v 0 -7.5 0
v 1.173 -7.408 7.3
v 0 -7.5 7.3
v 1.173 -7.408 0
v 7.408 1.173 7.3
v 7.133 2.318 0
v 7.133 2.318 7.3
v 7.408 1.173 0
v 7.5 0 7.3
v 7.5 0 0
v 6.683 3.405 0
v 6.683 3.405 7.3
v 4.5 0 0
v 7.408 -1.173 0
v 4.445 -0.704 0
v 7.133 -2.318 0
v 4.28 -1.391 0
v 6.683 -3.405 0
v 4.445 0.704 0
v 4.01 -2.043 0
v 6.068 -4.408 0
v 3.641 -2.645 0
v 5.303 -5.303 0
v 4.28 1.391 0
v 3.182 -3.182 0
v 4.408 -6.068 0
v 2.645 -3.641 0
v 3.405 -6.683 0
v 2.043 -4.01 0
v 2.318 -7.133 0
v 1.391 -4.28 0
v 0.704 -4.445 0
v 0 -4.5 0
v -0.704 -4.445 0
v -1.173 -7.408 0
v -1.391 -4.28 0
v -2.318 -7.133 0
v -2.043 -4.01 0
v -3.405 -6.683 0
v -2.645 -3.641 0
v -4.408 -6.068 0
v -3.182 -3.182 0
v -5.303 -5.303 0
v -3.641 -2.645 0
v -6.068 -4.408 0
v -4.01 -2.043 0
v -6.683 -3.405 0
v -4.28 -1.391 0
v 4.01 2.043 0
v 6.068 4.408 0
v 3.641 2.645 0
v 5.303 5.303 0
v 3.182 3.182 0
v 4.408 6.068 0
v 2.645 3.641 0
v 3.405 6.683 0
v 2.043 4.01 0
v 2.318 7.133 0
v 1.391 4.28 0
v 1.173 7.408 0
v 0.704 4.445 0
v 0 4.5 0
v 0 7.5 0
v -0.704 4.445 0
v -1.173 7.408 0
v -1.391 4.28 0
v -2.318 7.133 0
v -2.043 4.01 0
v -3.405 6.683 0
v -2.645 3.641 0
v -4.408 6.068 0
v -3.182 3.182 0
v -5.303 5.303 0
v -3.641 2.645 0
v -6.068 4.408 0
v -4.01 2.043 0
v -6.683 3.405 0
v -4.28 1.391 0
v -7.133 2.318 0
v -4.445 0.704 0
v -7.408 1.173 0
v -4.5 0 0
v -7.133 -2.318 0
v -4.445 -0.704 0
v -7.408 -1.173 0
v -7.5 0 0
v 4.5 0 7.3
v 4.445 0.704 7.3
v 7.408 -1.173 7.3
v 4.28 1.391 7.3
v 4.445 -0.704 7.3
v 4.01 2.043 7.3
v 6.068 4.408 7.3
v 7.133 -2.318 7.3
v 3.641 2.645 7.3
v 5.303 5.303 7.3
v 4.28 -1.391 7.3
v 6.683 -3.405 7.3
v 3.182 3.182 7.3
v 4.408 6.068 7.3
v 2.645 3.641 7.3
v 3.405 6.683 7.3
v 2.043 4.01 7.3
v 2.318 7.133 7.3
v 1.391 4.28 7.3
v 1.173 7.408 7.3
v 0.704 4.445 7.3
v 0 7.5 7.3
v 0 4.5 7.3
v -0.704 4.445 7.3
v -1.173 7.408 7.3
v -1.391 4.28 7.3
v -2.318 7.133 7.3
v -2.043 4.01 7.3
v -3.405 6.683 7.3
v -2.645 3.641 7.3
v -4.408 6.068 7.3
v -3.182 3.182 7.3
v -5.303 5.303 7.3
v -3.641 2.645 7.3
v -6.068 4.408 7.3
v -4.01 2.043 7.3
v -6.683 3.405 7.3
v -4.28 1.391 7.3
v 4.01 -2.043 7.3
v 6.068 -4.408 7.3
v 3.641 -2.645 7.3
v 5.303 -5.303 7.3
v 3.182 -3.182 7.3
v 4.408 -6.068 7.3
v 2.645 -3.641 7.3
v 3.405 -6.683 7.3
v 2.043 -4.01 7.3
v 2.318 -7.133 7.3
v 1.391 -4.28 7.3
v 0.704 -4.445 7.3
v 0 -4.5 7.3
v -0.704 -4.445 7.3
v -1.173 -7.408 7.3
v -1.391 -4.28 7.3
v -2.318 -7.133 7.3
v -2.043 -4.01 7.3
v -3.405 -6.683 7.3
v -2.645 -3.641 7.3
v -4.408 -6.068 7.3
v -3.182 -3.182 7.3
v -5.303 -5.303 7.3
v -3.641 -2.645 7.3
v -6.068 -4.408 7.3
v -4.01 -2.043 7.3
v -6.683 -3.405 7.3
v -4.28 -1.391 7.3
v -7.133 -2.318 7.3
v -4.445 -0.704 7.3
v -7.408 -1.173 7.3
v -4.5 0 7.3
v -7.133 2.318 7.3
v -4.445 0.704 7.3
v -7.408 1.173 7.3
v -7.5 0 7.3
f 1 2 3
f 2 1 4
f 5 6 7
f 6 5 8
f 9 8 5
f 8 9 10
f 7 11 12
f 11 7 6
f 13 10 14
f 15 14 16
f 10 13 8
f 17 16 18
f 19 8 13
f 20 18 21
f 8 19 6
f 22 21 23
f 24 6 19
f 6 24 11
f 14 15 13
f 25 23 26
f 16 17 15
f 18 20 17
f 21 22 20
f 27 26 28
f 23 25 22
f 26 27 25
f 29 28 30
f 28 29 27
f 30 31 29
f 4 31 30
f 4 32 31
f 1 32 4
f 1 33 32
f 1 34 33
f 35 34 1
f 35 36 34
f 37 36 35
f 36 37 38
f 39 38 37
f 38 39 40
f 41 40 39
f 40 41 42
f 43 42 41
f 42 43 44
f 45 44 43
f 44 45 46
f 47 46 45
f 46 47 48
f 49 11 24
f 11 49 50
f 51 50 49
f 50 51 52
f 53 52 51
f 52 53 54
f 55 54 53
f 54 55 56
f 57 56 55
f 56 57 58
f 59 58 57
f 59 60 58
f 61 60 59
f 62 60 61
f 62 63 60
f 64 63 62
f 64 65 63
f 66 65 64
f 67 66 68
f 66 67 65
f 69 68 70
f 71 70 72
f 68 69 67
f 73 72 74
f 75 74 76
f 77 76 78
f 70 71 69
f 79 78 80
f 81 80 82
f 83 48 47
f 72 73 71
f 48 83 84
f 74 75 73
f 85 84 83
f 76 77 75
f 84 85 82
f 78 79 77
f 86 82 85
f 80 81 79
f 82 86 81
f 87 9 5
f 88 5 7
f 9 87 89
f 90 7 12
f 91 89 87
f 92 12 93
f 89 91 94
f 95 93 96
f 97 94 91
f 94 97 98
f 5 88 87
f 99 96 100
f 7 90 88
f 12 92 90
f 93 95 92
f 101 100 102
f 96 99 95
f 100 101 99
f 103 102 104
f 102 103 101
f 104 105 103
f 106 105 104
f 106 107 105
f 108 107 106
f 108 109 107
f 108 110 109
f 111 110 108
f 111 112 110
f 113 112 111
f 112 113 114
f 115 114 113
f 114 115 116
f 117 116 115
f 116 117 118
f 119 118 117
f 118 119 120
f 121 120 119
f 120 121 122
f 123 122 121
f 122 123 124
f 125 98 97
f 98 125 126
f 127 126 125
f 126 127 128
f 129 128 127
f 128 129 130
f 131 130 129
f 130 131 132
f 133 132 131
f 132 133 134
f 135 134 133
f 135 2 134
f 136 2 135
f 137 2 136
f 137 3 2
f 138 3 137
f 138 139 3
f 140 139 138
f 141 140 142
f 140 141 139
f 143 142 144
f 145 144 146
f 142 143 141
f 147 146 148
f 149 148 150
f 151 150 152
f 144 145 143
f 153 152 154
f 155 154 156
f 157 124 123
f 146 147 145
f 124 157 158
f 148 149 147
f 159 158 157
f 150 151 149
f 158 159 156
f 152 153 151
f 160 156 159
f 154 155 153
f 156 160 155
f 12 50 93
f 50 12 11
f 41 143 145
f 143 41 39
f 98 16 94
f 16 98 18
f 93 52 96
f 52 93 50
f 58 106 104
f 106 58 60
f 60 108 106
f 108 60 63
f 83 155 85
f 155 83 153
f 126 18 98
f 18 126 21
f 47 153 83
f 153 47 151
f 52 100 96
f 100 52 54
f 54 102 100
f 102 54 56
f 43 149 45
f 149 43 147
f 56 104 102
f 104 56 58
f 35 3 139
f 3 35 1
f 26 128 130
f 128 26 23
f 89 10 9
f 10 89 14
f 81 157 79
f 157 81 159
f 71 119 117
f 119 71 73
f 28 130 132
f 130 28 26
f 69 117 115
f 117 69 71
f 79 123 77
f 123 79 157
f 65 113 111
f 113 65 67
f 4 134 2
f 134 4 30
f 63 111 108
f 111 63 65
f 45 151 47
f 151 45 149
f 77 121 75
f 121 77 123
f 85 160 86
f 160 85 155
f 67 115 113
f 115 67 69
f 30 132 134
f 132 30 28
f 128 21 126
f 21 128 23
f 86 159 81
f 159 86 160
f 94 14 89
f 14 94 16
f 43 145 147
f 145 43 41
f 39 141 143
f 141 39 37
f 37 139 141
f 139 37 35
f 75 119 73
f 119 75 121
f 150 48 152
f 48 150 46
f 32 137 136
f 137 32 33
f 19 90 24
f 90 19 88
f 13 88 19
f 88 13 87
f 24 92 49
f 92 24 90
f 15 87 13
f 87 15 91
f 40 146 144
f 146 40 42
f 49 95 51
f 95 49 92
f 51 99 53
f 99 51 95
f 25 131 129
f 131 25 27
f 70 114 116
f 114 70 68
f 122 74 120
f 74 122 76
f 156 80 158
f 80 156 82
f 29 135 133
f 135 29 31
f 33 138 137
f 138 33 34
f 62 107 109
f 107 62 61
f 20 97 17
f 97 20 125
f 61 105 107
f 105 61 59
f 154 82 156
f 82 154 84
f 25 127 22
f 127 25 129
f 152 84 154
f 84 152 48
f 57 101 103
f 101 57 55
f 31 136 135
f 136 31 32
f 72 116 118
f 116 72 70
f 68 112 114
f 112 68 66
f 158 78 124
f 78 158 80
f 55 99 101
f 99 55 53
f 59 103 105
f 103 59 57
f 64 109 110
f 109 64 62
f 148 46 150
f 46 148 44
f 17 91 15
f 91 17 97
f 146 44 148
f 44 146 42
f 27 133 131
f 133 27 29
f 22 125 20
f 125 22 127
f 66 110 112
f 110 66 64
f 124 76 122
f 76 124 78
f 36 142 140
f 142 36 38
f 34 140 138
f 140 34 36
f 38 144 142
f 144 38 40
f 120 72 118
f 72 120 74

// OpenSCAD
difference()
{
cylinder(r=7.5,h=7.3,$fn=40);
cylinder(r=4.5,h=7.4,$fn=40);

}
